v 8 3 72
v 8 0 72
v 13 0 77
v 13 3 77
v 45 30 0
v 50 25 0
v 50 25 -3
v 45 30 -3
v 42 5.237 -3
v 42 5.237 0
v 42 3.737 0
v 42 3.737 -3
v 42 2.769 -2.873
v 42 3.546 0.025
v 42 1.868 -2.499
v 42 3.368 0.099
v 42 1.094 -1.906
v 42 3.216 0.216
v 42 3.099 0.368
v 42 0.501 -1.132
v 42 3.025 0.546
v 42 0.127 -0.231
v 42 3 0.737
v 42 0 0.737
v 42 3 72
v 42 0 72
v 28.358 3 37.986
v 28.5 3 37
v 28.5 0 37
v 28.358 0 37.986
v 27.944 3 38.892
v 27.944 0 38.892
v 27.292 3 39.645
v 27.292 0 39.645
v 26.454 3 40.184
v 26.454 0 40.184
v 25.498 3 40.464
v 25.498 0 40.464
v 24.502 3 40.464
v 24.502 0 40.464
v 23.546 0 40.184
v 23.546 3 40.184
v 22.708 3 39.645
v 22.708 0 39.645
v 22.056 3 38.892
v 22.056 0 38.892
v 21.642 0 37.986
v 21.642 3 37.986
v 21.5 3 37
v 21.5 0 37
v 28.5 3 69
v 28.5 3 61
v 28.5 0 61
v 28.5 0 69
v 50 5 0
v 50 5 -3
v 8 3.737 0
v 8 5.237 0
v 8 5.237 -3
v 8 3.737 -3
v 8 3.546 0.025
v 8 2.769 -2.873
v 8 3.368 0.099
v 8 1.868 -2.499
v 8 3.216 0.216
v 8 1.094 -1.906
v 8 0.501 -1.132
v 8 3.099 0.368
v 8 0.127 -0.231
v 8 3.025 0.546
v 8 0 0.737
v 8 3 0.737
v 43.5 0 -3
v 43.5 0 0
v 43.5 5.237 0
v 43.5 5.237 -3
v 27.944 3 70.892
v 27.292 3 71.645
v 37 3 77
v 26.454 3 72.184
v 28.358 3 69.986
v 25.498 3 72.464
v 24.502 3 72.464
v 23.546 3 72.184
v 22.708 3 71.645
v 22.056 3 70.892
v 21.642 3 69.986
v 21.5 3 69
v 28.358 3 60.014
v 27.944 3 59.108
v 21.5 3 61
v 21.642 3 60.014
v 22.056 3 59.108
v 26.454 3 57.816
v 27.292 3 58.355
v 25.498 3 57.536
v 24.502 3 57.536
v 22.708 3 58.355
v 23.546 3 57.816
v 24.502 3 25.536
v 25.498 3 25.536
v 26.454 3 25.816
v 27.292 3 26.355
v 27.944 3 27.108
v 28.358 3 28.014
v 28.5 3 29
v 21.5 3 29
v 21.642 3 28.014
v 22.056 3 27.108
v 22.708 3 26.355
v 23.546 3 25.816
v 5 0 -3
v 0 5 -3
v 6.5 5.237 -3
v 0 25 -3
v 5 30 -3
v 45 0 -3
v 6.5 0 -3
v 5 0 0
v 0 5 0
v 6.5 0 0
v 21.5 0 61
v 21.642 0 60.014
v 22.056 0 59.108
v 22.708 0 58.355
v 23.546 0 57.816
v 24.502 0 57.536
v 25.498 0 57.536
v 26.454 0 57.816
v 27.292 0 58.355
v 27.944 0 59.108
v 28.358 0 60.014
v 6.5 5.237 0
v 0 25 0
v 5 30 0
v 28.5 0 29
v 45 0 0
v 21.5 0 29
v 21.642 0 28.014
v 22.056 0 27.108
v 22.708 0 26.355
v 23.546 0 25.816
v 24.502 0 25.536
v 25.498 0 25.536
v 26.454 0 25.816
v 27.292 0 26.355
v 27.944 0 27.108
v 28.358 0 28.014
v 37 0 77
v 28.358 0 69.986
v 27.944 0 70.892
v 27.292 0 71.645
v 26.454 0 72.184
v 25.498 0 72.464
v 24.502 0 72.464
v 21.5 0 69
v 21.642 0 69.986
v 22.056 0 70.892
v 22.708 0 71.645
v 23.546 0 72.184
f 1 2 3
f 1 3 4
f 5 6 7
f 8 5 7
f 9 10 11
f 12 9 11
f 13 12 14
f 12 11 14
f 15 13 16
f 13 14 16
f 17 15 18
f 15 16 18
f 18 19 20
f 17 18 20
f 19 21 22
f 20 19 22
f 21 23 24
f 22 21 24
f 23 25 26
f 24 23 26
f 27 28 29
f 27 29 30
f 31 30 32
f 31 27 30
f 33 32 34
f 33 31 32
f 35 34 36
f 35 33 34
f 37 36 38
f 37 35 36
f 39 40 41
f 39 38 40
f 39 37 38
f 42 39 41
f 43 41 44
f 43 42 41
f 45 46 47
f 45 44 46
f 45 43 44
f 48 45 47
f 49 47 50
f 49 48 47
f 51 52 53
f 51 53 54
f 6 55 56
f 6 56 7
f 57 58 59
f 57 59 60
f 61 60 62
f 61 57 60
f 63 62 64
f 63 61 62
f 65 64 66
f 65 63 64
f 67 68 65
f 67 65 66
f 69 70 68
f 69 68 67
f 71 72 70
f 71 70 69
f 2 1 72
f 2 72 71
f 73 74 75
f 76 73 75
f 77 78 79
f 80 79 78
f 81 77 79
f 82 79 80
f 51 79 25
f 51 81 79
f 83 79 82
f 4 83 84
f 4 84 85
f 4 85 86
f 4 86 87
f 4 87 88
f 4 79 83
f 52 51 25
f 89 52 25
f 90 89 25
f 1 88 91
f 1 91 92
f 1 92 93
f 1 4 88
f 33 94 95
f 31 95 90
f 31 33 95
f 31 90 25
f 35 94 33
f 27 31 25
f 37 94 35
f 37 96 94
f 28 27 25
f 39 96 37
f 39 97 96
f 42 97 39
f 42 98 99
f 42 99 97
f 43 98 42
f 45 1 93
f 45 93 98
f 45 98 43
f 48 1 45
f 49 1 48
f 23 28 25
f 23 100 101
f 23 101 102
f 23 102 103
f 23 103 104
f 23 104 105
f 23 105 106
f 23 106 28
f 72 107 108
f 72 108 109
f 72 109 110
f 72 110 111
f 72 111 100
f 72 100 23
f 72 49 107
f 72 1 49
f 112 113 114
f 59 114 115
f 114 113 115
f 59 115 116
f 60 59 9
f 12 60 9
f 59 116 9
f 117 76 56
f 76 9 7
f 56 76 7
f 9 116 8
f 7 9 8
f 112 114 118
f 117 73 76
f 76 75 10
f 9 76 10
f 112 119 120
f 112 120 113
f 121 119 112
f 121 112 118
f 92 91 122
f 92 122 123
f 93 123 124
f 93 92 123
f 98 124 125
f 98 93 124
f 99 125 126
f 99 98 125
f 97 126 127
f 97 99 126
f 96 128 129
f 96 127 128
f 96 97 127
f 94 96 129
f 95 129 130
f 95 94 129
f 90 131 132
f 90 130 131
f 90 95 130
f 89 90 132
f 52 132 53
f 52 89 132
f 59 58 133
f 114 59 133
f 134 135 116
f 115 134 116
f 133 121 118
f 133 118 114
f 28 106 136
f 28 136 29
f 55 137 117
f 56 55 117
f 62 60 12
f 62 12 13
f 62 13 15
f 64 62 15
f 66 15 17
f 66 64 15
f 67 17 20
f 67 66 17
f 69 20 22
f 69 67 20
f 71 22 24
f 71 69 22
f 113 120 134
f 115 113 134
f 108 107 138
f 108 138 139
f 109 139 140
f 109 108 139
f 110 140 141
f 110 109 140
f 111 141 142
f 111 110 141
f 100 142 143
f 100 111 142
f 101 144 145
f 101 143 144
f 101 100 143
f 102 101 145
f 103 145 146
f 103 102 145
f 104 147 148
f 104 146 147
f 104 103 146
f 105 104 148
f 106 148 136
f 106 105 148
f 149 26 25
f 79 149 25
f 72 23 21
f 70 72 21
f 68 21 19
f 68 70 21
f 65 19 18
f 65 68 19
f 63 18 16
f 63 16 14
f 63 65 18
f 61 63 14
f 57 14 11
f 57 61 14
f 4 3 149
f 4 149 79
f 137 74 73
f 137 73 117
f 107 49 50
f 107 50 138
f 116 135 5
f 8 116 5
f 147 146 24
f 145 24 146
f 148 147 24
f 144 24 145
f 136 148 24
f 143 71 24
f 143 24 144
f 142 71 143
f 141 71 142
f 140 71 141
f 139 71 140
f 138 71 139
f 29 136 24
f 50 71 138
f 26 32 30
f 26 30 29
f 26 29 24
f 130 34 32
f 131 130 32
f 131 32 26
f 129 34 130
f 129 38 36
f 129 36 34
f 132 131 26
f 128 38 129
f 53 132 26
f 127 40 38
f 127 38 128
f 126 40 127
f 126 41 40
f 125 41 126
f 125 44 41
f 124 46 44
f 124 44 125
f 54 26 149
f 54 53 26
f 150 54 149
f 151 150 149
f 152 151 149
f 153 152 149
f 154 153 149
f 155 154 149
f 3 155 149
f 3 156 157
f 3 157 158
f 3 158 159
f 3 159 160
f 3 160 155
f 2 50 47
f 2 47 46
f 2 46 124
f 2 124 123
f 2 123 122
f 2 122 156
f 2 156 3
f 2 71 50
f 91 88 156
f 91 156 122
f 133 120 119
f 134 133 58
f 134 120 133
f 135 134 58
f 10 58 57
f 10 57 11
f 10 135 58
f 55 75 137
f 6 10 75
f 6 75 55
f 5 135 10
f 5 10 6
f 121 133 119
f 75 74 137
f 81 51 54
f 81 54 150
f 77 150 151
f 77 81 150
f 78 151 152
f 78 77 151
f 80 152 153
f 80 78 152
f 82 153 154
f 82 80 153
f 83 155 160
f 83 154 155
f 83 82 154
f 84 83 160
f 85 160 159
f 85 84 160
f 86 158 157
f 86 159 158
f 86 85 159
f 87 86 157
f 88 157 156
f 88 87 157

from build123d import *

# Parameters (mm, degrees)
SKETCH_1_W                        = 50
SKETCH_1_H                        = 30
SM_BASE_FLANGE_1_DEPTH            = 3
SM_EDGE_FLANGE_1_STRIP_W          = 13.4732
SM_EDGE_FLANGE_1_STRIP_H          = 3
SM_EDGE_FLANGE_1_STRIP_CUT_DEPTH  = 34
SM_EDGE_FLANGE_1_RELIEF_W         = 14.9732
SM_EDGE_FLANGE_1_RELIEF_H         = 1.5
SM_EDGE_FLANGE_1_RELIEF_CUT_DEPTH = 3
SM_EDGE_FLANGE_1_DEPTH            = 34
CHAMFER_1_SIZE                    = 5
CUT_EXTRUDE_1_DEPTH               = 10


# Sheet-metal steps are written as plain solids
with BuildPart() as part:
    # Sketch 1 → 基体-法兰1 (new body)
    with BuildSketch(Plane.XY):
        with Locations((25, 15)):
            Rectangle(SKETCH_1_W, SKETCH_1_H)
    extrude(amount=-SM_BASE_FLANGE_1_DEPTH)

    # 边线-法兰1 strip (across the edge) → 边线-法兰1 strip cut (cut)
    with BuildSketch(Plane.YZ.offset(8)):
        with Locations((-3, -1.5)):
            Rectangle(SM_EDGE_FLANGE_1_STRIP_W, SM_EDGE_FLANGE_1_STRIP_H)
    extrude(amount=SM_EDGE_FLANGE_1_STRIP_CUT_DEPTH, mode=Mode.SUBTRACT)

    # 边线-法兰1 relief (on the sheet) → 边线-法兰1 relief cut (cut)
    with BuildSketch(Plane(origin=(8, 3.7366, 0), x_dir=(0, 1, 0), z_dir=(0, 0, 1))):
        with Locations((-5.9866, 0.75)):
            Rectangle(SM_EDGE_FLANGE_1_RELIEF_W, SM_EDGE_FLANGE_1_RELIEF_H)
        with Locations((-5.9866, -34.75)):
            Rectangle(SM_EDGE_FLANGE_1_RELIEF_W, SM_EDGE_FLANGE_1_RELIEF_H)
    extrude(amount=-SM_EDGE_FLANGE_1_RELIEF_CUT_DEPTH, mode=Mode.SUBTRACT)

    # 边线-法兰1 section (across the edge) → 边线-法兰1 (add)
    with BuildSketch(Plane.YZ.offset(8)):
        with BuildLine():
            Line((0, 0.7366), (0, 77))
            Line((0, 77), (3, 77))
            Line((3, 77), (3, 0.7366))
            ThreePointArc((3, 0.7366), (3.215745145, 0.215745145), (3.7366, 0))
            Line((3.7366, 0), (3.7366, -3))
            ThreePointArc((3.7366, -3), (1.094424801, -1.905575199), (0, 0.7366))
        make_face()
    extrude(amount=SM_EDGE_FLANGE_1_DEPTH)

    # 倒角1
    chamfer_1_edges = [part.edges().sort_by_distance(p)[0] for p in [
        (8, 1.5, 77),
        (42, 1.5, 77),
        (0, 30, -1.5),
        (50, 30, -1.5),
        (50, 0, -1.5),
        (0, 0, -1.5),
    ]]
    chamfer(chamfer_1_edges, length=CHAMFER_1_SIZE)

    # 草图9 → 切除-拉伸1 (cut)
    with BuildSketch(Plane(origin=(0, 3, 0), x_dir=(1, 0, 0), z_dir=(0, 1, 0))):
        with BuildLine():
            Line((28.5, -29), (28.5, -37))
            ThreePointArc((28.5, -37), (25, -40.5), (21.5, -37))
            Line((21.5, -37), (21.5, -29))
            ThreePointArc((21.5, -29), (25, -25.5), (28.5, -29))
        make_face()
        with BuildLine():
            Line((21.5, -69), (21.5, -61))
            ThreePointArc((21.5, -61), (25, -57.5), (28.5, -61))
            Line((28.5, -61), (28.5, -69))
            ThreePointArc((28.5, -69), (25, -72.5), (21.5, -69))
        make_face()
    extrude(amount=-CUT_EXTRUDE_1_DEPTH, mode=Mode.SUBTRACT)


solid = part.part
